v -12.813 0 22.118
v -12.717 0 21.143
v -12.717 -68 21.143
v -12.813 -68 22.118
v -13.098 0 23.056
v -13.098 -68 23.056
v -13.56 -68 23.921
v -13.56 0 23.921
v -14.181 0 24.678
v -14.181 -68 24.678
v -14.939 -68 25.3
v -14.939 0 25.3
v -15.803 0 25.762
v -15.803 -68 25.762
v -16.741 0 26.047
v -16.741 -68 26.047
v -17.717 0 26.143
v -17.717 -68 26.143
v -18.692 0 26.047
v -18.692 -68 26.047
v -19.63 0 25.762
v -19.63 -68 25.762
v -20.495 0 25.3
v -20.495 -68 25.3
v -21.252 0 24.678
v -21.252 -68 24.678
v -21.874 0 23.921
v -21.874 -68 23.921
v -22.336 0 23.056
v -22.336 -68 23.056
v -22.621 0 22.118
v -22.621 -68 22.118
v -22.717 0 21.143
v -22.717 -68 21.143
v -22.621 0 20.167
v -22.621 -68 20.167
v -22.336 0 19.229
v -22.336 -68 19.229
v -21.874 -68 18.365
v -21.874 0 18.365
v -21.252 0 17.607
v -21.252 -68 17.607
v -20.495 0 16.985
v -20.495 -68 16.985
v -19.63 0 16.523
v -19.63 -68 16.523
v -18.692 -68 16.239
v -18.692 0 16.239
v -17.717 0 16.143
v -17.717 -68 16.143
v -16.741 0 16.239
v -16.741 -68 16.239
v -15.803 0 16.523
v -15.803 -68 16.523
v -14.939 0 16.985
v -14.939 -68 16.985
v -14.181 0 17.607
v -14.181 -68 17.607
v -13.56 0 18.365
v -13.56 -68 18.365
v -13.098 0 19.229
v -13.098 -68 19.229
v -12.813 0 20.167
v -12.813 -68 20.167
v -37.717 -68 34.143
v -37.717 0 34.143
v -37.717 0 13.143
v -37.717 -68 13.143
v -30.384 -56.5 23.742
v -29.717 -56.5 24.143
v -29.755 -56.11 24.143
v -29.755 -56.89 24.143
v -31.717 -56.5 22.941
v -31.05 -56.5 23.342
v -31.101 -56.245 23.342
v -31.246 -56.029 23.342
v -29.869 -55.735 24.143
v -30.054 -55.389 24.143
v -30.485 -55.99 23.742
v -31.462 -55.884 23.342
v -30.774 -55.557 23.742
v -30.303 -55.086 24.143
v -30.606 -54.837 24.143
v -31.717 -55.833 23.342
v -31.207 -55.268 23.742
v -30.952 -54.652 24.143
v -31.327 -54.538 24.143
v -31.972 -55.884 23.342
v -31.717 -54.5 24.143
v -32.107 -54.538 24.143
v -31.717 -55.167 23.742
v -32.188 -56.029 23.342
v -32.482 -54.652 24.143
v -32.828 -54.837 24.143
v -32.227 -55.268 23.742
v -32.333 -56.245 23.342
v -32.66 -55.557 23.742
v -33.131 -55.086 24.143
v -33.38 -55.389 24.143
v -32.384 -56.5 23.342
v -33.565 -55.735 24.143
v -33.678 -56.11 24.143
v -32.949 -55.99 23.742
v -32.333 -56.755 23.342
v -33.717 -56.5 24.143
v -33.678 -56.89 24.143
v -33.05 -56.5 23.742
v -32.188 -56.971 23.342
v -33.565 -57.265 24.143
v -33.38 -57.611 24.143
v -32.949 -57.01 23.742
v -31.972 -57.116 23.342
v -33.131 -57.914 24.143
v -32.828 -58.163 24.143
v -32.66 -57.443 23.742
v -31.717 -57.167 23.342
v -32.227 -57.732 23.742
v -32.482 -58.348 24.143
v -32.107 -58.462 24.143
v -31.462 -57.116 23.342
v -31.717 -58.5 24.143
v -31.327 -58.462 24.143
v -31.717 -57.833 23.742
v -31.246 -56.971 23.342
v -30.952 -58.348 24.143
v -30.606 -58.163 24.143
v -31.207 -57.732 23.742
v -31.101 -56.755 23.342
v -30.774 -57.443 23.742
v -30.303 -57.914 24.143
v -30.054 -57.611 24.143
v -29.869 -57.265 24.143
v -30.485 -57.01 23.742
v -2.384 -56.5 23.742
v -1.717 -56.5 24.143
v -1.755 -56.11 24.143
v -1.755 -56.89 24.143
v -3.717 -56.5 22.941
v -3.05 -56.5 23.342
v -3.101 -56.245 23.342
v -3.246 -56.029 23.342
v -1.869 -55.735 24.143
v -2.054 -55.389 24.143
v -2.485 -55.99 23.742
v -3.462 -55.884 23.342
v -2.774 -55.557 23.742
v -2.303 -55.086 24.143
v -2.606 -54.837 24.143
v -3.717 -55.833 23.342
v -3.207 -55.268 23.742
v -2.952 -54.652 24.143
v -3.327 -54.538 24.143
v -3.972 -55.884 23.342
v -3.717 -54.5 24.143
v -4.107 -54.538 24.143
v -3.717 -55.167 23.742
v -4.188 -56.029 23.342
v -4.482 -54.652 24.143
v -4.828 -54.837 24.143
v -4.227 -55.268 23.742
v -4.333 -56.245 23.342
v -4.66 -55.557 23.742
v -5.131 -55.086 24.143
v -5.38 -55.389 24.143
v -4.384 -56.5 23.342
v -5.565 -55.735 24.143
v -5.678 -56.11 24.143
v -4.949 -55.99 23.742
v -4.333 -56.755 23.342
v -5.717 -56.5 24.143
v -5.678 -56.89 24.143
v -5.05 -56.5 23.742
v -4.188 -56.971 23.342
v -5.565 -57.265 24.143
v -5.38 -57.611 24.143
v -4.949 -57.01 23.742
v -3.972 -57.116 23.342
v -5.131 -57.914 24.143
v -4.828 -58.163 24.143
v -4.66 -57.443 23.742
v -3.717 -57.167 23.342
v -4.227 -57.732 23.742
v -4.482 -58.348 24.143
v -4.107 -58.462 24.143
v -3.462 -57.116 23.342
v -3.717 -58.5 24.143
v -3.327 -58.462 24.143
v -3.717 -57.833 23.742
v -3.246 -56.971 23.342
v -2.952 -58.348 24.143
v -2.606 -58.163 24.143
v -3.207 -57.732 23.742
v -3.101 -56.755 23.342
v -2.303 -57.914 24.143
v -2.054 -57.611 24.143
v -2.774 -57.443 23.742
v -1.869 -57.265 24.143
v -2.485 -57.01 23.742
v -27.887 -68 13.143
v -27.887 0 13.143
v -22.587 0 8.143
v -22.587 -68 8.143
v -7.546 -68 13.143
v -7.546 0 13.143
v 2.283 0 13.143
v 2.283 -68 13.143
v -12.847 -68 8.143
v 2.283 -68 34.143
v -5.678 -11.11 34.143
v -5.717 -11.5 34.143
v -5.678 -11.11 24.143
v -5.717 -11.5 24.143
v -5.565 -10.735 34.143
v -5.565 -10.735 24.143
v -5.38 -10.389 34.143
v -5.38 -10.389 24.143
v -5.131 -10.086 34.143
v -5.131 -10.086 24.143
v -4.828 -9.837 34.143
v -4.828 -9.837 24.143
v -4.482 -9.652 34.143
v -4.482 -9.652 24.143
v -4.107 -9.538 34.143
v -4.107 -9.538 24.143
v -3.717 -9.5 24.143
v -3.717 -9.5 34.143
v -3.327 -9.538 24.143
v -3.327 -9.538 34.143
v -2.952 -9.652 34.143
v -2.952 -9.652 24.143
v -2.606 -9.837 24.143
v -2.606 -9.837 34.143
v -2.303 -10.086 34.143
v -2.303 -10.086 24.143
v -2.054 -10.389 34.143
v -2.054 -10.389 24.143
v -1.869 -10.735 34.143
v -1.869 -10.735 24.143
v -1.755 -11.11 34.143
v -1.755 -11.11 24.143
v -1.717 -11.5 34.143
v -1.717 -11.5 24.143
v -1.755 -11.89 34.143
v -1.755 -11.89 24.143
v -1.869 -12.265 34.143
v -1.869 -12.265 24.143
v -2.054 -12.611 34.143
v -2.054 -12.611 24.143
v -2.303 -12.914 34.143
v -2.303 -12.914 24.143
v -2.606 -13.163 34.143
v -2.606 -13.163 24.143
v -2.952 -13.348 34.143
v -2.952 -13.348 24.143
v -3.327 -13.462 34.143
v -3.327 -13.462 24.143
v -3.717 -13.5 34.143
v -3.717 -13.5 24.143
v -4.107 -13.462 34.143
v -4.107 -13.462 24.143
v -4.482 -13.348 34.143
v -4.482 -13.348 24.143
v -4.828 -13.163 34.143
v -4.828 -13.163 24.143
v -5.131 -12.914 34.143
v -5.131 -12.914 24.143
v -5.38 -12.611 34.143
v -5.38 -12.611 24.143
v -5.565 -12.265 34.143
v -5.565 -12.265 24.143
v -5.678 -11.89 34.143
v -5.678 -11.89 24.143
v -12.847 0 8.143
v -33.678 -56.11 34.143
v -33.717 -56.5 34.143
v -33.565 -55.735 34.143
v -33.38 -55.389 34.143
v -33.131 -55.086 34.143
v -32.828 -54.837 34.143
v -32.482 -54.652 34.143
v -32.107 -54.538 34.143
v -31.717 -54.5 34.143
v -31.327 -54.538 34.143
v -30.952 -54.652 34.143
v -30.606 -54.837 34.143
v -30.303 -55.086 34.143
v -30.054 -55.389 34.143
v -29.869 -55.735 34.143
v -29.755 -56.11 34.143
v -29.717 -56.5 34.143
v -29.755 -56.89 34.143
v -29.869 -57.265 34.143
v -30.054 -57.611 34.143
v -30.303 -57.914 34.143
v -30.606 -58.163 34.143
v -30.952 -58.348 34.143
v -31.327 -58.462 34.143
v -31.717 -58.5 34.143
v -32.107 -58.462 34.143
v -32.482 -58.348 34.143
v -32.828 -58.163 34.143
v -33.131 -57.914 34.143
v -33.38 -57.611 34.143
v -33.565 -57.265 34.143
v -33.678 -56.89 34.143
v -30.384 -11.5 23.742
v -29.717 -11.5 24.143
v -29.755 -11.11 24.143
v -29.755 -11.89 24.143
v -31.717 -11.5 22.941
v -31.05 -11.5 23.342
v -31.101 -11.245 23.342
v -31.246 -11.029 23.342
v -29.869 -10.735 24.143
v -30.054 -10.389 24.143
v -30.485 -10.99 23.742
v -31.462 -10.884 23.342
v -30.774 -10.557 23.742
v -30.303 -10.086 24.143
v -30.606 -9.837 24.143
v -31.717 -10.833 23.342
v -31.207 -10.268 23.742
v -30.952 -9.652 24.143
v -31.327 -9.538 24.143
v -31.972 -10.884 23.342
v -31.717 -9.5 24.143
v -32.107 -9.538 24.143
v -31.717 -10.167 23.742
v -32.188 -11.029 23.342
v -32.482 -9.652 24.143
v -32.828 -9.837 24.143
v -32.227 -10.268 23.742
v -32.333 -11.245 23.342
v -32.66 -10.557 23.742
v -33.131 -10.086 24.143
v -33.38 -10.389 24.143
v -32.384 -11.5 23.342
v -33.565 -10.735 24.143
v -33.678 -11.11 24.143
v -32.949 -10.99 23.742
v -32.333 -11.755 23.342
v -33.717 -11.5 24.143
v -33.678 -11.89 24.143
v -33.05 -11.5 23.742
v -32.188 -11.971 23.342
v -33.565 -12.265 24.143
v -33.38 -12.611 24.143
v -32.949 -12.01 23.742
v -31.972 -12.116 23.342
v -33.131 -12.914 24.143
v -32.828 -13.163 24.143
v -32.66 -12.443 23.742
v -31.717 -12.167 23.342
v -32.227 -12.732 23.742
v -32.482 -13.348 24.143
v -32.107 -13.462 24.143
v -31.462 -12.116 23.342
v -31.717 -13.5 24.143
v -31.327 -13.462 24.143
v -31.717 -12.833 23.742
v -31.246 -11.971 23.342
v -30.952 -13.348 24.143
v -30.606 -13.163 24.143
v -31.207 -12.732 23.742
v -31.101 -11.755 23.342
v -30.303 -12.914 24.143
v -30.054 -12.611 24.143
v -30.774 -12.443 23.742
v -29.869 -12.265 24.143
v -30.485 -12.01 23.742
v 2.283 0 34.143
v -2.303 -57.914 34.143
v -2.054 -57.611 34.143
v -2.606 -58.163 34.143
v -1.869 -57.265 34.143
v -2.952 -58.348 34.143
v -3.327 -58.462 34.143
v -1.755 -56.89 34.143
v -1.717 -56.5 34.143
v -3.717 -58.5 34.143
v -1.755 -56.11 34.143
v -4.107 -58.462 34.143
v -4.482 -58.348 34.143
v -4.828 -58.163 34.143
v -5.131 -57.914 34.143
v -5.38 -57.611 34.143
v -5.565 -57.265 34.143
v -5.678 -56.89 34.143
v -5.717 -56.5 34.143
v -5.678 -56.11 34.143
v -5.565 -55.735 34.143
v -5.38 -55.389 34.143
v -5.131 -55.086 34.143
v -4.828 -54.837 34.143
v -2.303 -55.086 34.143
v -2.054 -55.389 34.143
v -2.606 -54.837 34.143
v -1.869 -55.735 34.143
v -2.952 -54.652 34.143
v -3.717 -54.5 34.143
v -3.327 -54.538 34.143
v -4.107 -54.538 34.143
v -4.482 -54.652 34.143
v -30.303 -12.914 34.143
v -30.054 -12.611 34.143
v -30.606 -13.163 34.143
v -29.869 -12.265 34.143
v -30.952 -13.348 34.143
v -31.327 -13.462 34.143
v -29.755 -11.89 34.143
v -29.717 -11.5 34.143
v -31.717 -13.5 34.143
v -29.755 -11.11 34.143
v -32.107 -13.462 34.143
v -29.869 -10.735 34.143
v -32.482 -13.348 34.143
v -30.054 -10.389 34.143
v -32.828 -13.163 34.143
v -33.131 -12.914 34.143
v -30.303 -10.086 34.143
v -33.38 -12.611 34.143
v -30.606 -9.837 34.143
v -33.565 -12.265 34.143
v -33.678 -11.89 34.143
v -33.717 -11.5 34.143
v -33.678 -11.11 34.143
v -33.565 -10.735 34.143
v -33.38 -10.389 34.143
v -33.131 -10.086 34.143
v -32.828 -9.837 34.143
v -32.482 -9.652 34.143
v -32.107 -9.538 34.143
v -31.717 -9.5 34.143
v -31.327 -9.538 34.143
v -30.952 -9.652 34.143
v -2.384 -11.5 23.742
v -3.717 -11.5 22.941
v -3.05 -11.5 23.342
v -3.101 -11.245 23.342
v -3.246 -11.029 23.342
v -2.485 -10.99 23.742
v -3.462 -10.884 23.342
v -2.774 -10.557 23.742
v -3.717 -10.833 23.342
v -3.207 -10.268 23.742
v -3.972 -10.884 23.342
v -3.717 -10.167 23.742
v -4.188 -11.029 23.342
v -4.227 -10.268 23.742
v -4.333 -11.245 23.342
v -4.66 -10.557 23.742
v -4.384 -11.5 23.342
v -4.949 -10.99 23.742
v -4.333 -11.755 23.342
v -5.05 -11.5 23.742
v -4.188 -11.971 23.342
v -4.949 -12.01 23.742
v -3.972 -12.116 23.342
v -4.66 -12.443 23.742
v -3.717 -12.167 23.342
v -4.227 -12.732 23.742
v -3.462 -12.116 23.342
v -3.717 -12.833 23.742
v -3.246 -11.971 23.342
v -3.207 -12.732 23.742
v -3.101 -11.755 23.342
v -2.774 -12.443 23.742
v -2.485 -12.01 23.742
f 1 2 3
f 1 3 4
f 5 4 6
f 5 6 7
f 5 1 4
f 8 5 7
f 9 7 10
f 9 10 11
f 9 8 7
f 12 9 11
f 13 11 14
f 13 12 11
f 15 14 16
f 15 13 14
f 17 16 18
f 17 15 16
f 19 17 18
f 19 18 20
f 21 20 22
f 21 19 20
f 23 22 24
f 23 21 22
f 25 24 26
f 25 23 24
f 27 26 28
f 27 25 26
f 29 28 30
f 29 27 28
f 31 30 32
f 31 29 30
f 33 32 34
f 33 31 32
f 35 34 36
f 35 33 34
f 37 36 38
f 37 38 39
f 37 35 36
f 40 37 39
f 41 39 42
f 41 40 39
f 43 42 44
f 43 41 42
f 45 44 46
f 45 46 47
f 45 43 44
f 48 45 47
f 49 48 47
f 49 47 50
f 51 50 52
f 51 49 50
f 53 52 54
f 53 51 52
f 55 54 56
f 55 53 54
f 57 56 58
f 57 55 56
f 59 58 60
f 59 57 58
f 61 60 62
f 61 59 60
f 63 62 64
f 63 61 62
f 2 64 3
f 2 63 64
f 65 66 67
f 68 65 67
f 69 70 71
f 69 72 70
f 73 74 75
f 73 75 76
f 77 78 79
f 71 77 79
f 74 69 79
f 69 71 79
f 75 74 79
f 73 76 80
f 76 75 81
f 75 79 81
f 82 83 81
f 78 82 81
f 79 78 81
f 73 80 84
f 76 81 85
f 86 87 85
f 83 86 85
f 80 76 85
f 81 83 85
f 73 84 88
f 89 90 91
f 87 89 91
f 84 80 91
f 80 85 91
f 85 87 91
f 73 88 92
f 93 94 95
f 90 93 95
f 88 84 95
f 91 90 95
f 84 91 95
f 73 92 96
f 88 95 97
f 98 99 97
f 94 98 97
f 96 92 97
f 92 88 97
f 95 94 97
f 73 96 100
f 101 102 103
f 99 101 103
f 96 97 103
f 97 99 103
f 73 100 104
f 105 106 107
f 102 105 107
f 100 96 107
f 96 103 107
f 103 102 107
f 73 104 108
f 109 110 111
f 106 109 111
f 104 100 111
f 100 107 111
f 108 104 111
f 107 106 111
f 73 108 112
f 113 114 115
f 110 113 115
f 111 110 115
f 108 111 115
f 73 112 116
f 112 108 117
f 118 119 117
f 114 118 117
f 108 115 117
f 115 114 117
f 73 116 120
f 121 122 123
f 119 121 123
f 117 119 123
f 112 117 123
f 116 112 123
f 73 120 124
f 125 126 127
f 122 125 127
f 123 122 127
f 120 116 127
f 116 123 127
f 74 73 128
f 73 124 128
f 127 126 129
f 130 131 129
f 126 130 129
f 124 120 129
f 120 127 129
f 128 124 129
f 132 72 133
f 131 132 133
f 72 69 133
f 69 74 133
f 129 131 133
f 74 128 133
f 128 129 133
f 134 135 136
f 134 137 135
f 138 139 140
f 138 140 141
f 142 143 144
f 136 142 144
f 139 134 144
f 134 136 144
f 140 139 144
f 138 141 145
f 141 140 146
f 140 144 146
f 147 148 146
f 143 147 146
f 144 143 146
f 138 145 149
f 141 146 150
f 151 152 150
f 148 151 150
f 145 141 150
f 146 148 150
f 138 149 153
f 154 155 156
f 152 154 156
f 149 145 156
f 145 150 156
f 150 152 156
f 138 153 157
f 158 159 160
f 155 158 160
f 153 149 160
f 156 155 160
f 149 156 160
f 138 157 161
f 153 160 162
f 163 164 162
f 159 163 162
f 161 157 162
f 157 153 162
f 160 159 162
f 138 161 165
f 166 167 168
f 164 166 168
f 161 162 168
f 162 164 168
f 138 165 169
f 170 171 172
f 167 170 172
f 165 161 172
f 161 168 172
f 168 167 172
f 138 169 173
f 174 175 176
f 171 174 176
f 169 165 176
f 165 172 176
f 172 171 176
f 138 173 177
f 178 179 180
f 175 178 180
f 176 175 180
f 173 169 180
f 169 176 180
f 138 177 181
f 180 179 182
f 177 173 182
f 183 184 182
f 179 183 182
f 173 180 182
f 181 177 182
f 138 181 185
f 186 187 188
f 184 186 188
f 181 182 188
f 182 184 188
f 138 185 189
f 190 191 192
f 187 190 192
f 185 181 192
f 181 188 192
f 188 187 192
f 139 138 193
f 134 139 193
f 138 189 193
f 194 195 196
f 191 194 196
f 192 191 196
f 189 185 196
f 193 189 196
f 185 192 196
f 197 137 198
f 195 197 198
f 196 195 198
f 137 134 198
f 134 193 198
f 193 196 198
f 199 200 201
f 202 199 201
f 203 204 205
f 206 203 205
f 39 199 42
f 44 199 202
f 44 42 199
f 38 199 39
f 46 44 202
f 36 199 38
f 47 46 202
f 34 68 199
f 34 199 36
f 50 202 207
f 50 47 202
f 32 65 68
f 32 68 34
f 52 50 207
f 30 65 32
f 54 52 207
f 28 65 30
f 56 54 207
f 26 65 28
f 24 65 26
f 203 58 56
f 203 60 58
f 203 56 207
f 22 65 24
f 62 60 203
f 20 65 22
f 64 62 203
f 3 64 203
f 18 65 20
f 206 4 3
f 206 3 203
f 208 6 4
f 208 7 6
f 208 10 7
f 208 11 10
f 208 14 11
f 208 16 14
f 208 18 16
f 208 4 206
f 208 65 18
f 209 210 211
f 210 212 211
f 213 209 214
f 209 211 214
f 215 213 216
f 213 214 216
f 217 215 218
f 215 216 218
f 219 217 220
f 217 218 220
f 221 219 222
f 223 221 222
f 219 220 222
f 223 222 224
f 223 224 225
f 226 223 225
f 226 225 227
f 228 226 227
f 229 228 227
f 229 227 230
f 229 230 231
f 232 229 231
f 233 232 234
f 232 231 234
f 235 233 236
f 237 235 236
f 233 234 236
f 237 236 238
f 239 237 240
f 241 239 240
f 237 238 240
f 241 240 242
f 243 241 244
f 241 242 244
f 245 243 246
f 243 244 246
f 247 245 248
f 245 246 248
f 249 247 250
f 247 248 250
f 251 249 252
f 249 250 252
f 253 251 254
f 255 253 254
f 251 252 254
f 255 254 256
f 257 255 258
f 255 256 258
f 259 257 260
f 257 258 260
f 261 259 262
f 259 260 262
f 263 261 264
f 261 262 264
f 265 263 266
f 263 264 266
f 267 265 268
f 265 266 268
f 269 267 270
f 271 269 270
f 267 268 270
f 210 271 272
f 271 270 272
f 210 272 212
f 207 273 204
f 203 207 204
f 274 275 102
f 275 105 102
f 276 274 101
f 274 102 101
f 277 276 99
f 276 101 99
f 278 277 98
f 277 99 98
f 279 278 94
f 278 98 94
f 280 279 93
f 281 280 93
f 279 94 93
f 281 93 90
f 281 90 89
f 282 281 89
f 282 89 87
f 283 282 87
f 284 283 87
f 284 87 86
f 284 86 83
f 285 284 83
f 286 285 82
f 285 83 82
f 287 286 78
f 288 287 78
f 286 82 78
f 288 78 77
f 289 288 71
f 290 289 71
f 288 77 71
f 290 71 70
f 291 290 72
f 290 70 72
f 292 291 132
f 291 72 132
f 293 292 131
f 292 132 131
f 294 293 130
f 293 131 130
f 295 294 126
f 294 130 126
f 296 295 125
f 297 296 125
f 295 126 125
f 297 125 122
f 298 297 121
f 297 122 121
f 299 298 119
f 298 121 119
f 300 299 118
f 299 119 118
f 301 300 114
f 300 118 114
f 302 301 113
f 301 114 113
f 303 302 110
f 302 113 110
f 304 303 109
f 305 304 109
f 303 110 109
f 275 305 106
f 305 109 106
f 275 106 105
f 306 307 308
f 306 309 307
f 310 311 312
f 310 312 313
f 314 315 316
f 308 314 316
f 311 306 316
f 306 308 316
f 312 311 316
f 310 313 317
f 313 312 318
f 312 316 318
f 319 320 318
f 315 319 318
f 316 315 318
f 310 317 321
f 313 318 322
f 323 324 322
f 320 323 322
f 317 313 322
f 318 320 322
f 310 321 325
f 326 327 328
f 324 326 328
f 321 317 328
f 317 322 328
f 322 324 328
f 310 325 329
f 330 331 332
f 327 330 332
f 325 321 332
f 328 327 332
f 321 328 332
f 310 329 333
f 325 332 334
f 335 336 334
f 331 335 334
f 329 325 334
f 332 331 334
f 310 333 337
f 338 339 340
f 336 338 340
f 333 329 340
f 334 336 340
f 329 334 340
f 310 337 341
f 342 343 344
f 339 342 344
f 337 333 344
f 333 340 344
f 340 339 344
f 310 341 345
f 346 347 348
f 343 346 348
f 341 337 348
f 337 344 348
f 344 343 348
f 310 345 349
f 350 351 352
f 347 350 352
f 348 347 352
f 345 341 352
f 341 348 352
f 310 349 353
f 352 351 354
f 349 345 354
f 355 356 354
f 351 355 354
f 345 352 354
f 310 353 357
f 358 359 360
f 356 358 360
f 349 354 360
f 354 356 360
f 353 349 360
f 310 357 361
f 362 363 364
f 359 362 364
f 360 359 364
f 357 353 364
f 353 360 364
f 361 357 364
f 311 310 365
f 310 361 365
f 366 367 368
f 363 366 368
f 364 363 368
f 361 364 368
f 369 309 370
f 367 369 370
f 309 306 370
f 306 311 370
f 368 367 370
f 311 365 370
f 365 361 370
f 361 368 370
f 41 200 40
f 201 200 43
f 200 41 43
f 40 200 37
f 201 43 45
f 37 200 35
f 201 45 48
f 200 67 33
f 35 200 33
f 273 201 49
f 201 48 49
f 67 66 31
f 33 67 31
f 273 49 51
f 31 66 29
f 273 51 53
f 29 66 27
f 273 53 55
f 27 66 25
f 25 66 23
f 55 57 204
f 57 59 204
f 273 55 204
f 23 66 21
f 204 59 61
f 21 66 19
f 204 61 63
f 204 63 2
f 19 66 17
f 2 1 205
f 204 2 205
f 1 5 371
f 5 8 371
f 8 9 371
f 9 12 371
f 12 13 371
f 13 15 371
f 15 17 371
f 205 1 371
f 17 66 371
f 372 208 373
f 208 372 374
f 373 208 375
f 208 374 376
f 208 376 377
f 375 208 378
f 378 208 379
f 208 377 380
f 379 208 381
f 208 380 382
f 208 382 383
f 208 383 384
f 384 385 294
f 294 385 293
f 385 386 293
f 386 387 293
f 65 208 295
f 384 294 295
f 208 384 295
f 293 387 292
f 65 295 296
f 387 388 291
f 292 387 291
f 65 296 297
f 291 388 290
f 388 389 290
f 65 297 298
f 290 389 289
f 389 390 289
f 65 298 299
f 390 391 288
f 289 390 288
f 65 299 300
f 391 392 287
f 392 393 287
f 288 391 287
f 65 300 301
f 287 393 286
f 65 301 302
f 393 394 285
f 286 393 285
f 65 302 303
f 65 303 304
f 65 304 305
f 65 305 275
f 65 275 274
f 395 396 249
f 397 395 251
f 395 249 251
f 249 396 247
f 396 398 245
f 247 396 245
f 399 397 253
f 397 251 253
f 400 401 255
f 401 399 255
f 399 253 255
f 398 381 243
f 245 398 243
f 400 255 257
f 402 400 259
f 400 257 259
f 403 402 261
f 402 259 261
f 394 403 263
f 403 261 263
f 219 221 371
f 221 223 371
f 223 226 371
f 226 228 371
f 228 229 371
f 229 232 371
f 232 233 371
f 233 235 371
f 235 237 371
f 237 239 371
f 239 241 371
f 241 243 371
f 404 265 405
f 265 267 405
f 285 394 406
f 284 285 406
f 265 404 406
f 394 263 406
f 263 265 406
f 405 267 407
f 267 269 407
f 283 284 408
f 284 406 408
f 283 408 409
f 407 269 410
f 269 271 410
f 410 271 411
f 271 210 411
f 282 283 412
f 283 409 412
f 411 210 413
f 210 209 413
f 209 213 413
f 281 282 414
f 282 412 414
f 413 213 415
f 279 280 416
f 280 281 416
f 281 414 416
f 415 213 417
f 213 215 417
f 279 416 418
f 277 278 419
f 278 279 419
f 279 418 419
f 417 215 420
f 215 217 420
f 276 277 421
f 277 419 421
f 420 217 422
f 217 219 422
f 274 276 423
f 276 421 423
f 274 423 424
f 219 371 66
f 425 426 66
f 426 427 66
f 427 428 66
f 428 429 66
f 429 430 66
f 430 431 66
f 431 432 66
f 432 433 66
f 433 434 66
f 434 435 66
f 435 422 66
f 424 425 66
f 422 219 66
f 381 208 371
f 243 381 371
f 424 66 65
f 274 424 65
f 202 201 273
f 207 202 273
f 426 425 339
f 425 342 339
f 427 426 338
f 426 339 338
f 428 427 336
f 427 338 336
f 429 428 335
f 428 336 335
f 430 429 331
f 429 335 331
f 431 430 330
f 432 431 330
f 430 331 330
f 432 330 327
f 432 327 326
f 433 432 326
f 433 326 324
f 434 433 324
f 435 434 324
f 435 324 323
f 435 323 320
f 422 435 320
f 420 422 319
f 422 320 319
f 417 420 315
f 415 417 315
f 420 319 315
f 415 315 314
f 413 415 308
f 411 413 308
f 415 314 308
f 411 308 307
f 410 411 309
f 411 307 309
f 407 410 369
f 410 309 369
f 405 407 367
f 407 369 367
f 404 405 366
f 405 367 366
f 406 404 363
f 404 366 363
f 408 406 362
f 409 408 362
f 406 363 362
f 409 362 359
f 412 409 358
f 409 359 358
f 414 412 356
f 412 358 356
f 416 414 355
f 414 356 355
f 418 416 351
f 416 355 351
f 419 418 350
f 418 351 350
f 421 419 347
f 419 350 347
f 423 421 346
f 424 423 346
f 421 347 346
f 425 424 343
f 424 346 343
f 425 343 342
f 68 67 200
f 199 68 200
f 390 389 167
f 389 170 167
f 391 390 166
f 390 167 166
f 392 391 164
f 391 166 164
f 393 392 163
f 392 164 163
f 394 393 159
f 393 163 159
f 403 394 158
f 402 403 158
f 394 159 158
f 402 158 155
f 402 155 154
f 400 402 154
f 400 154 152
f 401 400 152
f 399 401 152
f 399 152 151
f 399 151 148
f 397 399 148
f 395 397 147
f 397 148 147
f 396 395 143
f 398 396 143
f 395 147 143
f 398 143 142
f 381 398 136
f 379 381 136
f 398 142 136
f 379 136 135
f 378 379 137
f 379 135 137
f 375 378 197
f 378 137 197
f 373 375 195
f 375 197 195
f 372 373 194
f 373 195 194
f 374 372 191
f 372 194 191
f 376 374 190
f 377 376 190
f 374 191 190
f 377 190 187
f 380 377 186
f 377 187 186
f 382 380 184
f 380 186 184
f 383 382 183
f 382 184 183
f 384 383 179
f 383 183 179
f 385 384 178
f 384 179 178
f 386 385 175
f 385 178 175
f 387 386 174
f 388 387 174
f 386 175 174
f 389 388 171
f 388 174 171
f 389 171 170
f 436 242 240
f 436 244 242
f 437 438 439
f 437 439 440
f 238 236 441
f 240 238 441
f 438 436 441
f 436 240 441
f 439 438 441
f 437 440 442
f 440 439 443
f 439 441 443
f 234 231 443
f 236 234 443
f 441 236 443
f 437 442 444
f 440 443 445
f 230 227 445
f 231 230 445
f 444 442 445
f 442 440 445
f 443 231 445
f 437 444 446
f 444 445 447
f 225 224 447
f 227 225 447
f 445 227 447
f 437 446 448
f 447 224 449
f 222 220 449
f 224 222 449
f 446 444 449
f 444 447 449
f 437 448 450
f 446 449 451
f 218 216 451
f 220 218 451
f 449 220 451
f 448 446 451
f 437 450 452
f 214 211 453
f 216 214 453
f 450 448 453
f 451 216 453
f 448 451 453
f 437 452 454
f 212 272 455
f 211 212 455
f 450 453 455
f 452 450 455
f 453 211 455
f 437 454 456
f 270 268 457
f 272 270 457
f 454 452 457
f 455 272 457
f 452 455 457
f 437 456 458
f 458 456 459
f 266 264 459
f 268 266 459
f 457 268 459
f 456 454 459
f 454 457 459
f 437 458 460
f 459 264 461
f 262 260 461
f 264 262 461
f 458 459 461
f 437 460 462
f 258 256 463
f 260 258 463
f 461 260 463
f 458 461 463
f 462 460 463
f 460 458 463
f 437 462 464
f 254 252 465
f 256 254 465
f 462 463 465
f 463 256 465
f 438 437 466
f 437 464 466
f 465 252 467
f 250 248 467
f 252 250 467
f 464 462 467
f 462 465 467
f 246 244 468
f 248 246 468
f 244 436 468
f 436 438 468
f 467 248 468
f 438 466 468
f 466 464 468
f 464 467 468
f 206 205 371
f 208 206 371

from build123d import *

# Parameters (mm, degrees)
F0_R     = 5
F1_DEPTH = 68
F3_D     = 4
F3_DEPTH = 10
F3_TIP   = 1.2017212381


with BuildPart() as f1:
    # F0 (on Front) → F1 (new body)
    with BuildSketch(Plane.XZ):
        Polygon((2.2830869555, 34.1427520012), (-37.7169130445, 34.1427520012), (-37.7169130445, 13.1427520012), (-27.8874205338, 13.1427520012), (-22.5867759436, 8.1427520012), (-12.8470501453, 8.1427520012), (-7.5464055551, 13.1427520012), (2.2830869555, 13.1427520012), align=None)
        with Locations((-17.7169130445, 21.1427520012)):
            Circle(F0_R, mode=Mode.SUBTRACT)
    extrude(amount=F1_DEPTH)

    # F3
    with Locations(Plane.XY.offset(34.1427520012)):
        with Locations((-31.7169130445, -11.5), (-31.7169130445, -56.5), (-3.7169130445, -11.5), (-3.7169130445, -56.5)):
            Hole(F3_D / 2, depth=F3_DEPTH)
            with Locations((0, 0, -(F3_DEPTH + F3_TIP / 2))):  # 118° drill point
                Cone(0, F3_D / 2, F3_TIP, mode=Mode.SUBTRACT)


solid = f1.part
